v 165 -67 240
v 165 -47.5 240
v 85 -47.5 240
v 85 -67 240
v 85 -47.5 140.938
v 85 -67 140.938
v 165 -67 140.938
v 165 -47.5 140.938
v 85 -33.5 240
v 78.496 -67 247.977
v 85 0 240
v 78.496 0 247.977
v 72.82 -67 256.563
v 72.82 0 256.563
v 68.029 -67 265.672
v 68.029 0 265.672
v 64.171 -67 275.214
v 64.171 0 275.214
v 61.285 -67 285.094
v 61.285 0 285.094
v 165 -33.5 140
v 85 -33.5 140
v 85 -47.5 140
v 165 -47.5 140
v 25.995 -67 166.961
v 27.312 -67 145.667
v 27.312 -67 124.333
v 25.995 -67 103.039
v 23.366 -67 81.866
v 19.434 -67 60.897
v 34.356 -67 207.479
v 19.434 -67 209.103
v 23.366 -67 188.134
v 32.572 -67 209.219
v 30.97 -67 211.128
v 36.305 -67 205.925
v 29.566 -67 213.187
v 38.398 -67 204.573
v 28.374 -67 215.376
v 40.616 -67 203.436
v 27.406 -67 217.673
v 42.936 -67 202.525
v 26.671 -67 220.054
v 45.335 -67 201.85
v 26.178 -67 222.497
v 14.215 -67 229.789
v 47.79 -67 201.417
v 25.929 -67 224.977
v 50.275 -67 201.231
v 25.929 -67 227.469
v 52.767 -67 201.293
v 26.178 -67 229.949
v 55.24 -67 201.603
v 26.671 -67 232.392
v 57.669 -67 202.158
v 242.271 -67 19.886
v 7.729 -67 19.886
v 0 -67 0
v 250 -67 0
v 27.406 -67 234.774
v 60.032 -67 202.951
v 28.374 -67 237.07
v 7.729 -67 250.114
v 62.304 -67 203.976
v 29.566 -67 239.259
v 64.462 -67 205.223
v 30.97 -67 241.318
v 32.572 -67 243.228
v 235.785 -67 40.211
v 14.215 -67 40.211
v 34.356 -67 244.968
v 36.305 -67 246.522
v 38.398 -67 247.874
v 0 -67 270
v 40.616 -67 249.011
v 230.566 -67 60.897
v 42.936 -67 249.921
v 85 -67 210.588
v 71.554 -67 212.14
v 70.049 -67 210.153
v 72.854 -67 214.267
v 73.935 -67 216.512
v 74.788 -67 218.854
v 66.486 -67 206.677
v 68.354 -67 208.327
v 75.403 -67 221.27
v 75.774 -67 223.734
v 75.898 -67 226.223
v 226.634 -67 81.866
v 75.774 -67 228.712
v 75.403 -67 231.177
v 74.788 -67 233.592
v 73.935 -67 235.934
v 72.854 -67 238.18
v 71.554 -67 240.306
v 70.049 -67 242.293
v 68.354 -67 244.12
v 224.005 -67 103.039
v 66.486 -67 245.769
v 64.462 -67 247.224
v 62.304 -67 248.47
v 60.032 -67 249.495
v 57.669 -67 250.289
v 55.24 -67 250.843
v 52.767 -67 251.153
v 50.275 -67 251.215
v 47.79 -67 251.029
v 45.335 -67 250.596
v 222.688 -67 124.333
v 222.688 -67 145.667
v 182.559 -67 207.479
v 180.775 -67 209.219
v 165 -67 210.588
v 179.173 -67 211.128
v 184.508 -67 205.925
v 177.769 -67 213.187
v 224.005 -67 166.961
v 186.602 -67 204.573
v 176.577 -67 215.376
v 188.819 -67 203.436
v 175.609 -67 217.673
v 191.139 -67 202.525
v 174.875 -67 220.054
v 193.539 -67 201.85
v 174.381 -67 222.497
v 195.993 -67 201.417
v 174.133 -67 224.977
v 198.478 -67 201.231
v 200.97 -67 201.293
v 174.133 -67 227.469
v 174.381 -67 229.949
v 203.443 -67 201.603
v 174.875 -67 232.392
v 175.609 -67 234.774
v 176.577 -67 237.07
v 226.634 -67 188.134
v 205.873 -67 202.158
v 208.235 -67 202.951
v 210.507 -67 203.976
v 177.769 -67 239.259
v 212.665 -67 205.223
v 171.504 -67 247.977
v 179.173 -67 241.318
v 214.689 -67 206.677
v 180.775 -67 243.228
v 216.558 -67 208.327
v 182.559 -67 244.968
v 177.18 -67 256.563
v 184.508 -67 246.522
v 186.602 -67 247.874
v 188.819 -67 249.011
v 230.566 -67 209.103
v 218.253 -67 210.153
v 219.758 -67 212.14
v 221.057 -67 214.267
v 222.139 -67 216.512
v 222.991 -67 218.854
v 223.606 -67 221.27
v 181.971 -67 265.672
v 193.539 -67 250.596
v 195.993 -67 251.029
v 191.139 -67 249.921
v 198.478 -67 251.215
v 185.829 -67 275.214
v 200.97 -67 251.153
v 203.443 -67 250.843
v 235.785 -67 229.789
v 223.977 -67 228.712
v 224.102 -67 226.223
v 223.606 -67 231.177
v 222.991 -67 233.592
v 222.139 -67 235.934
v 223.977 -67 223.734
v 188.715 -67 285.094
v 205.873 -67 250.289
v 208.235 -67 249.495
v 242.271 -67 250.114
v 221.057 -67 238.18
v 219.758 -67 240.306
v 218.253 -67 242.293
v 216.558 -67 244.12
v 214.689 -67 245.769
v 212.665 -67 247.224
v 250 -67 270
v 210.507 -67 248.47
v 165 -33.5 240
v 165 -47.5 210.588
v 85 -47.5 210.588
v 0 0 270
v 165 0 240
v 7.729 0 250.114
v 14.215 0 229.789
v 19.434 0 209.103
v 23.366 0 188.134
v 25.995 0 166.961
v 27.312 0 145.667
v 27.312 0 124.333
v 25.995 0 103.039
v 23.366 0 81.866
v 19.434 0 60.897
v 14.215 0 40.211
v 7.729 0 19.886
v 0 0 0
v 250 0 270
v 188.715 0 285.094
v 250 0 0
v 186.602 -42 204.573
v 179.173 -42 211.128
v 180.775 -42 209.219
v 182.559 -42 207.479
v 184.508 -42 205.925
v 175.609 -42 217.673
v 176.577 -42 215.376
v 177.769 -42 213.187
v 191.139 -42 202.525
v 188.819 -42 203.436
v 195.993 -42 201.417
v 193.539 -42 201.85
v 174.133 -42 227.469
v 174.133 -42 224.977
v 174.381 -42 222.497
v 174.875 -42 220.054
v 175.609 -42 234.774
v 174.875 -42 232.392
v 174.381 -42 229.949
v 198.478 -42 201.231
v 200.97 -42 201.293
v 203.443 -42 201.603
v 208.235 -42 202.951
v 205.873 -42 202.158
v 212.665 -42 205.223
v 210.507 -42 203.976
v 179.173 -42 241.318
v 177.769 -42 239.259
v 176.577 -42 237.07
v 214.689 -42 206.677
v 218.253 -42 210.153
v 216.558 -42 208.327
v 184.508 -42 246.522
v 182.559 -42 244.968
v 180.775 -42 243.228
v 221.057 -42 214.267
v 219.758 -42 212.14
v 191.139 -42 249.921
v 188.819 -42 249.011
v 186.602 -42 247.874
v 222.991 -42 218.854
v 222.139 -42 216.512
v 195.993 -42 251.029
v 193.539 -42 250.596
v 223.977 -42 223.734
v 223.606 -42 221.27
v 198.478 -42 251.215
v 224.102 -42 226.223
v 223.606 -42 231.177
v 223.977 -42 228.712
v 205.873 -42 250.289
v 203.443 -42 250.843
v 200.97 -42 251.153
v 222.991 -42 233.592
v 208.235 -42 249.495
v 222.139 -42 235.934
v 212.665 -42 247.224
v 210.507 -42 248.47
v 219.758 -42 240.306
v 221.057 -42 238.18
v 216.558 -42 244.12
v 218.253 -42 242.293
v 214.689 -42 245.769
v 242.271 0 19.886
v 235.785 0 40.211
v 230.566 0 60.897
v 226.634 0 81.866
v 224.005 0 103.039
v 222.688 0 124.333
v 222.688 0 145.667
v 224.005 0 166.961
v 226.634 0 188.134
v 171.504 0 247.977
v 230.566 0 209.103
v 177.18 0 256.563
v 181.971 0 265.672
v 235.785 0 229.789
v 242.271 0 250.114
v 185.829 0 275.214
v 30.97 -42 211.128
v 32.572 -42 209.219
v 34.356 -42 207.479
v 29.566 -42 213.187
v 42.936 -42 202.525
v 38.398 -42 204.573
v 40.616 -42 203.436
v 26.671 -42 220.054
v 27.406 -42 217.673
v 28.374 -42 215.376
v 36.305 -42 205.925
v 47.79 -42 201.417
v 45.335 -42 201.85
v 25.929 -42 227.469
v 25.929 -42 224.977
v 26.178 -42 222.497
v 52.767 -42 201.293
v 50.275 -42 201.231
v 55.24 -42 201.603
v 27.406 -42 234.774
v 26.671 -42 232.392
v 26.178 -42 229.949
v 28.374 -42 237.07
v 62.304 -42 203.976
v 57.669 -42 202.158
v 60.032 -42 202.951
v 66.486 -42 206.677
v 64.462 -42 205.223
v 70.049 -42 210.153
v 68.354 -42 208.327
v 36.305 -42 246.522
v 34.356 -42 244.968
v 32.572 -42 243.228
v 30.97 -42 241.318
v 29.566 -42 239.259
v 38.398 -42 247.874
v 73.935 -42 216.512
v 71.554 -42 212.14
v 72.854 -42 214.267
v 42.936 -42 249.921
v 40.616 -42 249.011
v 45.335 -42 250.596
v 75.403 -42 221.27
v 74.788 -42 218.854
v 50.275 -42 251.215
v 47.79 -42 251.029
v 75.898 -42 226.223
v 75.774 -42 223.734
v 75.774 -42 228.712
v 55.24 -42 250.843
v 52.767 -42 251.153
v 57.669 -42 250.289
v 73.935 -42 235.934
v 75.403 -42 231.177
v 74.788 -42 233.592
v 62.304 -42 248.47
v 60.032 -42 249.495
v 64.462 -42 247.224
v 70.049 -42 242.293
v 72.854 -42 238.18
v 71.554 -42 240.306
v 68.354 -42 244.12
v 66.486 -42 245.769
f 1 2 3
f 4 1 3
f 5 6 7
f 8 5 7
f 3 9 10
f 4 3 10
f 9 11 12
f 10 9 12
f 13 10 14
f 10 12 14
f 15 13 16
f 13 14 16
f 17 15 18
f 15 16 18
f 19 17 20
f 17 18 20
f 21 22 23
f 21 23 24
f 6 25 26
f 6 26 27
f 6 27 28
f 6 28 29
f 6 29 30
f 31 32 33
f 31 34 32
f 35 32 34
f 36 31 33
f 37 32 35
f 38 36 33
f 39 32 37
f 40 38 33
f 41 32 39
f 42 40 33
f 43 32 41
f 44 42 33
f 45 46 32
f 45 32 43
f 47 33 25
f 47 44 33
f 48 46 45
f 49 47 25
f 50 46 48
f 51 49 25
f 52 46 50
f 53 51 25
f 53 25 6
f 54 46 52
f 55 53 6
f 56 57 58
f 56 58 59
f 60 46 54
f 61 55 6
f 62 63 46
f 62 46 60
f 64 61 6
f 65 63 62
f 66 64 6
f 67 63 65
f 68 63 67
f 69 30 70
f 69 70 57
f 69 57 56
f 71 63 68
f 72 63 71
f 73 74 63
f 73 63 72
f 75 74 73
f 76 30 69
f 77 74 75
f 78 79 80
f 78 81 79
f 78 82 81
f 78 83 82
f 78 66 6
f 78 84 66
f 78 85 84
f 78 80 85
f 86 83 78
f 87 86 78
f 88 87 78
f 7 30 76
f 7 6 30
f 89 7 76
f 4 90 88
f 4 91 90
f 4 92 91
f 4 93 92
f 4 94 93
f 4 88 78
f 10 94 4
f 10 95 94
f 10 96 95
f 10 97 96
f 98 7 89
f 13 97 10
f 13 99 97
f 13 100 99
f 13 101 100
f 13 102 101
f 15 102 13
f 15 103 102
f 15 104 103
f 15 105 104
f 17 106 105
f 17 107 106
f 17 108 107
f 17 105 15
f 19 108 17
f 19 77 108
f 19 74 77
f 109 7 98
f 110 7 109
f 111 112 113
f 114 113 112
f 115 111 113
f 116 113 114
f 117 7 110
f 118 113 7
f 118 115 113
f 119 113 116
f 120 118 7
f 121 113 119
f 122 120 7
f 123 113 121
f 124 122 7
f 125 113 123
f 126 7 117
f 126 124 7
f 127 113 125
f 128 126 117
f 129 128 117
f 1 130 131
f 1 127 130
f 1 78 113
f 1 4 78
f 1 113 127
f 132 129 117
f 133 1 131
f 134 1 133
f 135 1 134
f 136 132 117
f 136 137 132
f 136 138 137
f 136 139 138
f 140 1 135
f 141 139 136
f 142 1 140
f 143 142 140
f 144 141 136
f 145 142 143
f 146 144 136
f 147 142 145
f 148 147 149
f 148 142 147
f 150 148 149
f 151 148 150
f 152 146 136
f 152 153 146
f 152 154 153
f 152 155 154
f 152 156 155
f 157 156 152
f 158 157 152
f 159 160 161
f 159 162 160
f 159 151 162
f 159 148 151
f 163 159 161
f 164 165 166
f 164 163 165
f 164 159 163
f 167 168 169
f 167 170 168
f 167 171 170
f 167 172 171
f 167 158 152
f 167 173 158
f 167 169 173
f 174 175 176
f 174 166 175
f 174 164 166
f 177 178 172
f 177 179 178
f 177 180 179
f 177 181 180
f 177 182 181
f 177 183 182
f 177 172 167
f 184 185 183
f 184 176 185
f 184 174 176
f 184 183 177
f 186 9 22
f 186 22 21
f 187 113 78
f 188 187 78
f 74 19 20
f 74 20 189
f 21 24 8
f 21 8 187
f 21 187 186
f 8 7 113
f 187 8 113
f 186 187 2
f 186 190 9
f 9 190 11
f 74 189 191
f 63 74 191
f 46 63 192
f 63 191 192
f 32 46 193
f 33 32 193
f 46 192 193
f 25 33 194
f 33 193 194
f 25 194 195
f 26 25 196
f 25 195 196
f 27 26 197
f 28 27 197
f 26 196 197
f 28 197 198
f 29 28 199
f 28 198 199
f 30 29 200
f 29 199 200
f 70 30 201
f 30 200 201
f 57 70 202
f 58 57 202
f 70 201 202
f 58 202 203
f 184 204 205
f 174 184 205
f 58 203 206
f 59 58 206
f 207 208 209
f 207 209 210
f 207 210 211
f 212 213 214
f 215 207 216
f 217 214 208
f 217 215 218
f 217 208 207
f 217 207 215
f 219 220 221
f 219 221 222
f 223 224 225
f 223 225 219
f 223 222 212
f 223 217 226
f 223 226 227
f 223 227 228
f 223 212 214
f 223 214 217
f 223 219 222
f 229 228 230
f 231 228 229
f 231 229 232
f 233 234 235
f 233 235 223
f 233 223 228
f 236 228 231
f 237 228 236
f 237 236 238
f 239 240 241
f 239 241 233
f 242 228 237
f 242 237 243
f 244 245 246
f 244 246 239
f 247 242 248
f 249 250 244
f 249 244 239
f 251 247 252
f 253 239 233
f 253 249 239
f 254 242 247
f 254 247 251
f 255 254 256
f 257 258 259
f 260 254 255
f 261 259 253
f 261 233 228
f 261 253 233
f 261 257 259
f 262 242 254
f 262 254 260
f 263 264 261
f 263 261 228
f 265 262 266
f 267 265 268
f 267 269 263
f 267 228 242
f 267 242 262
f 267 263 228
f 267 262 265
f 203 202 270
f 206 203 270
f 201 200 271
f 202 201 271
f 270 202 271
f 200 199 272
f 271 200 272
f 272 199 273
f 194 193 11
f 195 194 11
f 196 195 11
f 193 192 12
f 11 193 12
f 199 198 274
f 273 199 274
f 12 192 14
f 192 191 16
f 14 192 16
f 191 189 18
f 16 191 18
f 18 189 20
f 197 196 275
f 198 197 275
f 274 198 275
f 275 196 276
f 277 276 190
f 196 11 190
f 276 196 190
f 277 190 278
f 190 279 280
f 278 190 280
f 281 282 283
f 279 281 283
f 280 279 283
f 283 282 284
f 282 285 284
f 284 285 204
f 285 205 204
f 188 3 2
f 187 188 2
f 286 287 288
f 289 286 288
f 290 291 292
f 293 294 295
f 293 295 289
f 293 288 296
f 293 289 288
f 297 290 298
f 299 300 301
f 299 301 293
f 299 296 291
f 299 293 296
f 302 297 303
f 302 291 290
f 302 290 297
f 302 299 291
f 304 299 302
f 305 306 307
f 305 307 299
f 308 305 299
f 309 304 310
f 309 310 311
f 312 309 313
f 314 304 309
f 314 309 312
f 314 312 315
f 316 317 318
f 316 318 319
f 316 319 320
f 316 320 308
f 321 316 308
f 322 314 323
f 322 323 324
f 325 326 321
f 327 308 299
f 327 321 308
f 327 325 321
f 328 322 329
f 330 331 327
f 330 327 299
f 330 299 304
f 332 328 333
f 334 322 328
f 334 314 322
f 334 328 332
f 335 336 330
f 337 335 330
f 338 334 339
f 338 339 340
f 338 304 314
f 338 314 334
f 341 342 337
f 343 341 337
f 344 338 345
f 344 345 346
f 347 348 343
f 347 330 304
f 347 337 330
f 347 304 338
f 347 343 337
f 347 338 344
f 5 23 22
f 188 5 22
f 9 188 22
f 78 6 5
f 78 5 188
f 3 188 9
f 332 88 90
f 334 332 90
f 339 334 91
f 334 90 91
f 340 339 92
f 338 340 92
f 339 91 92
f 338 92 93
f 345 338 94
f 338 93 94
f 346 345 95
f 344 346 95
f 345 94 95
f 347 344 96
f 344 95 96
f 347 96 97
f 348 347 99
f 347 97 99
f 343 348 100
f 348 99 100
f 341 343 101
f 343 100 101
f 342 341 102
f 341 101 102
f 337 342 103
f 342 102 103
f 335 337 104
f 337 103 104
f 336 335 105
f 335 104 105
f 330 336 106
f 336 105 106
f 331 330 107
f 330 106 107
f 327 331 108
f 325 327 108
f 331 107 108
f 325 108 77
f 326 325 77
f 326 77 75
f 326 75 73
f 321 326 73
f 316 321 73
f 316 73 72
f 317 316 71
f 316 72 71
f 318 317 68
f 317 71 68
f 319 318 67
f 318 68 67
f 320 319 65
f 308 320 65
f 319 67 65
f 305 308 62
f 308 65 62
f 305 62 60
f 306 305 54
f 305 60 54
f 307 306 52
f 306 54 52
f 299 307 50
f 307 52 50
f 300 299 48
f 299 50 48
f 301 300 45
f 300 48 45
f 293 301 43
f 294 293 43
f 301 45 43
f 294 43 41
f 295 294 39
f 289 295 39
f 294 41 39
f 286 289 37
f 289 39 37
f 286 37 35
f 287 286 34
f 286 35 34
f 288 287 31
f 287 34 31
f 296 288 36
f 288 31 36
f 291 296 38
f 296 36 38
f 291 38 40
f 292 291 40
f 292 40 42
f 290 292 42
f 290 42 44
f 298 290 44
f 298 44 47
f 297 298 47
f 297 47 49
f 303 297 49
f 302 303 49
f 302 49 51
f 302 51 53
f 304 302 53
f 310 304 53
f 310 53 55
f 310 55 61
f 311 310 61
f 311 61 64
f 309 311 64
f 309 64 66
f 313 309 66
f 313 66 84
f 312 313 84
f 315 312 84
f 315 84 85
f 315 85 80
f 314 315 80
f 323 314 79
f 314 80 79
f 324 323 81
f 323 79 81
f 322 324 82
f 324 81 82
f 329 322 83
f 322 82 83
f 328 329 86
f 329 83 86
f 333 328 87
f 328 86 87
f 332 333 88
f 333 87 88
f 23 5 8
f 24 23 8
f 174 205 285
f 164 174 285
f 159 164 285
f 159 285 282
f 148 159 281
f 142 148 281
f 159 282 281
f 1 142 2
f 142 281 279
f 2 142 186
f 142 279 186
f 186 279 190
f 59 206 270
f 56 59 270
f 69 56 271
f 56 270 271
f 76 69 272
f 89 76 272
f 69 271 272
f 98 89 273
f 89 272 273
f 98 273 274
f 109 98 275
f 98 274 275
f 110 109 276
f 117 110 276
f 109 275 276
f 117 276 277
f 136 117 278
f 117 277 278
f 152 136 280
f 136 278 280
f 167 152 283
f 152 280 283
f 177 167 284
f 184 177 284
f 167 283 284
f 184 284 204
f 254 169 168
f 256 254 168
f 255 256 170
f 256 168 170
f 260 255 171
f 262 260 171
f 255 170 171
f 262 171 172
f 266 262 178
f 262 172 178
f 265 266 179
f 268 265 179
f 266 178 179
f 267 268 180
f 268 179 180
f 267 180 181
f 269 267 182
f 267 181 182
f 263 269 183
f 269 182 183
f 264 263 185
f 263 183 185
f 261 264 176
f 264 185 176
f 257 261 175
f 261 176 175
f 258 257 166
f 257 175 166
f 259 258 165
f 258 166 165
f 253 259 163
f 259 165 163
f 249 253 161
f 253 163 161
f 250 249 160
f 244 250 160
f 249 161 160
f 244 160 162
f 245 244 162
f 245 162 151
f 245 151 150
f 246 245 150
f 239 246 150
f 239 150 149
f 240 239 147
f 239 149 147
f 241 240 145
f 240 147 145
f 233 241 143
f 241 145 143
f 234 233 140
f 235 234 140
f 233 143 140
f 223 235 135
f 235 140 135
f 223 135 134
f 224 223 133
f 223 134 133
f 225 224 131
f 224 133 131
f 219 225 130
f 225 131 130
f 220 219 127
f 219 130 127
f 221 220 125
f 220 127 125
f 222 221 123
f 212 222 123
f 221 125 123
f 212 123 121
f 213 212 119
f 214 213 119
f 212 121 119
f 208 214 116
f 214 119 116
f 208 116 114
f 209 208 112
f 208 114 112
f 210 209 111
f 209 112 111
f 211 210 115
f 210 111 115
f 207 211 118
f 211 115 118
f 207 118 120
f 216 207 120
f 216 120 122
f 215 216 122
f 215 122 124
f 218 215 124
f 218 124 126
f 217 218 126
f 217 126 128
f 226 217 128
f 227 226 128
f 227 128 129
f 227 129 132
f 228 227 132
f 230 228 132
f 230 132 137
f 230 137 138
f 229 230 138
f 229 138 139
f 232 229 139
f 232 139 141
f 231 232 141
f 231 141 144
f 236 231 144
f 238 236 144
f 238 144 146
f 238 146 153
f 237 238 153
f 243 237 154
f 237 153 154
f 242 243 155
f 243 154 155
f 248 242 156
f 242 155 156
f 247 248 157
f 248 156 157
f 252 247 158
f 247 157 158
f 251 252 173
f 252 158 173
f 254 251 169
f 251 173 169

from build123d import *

# Parameters (mm, degrees)
F1_DEPTH = 67
F2_W     = 40
F2_H     = 69.649726
F3_DEPTH = 28
F2_R     = 25
F4_DEPTH = 25
F5_W     = 80
F5_H     = 14
F6_DEPTH = 100


with BuildPart() as f1:
    # F0 (on Front) → F1 (new body)
    with BuildSketch(Plane.XZ):
        with BuildLine():
            ThreePointArc((0, 270), (27.477124, 135), (0, 0))
            Line((0, 0), (125, 0))
            Line((125, 0), (125, 240))
            Line((125, 240), (85, 240))
            ThreePointArc((85, 240), (70.310796, 261.057784), (61.28452, 285.093784))
            Line((61.28452, 285.093784), (0, 270))
        make_face()
        with BuildLine():
            Line((125, 240), (125, 0))
            Line((125, 0), (250, 0))
            ThreePointArc((250, 0), (222.522876, 135), (250, 270))
            Line((250, 270), (188.71548, 285.093784))
            ThreePointArc((188.71548, 285.093784), (179.689204, 261.057784), (165, 240))
            Line((165, 240), (125, 240))
        make_face()
    extrude(amount=F1_DEPTH)

    # F2 (on face) → F3 (cut)
    with BuildSketch(Plane.XZ.offset(67)):
        with Locations((105, 175.762683)):
            Rectangle(F2_W, F2_H)
        with Locations((145, 175.762683)):
            Rectangle(F2_W, F2_H)
    extrude(amount=-F3_DEPTH, mode=Mode.SUBTRACT)

    # F2 (on face) → F4 (cut)
    with BuildSketch(Plane.XZ.offset(67)):
        with Locations((105, 175.762683)):
            Rectangle(F2_W, F2_H)
        with Locations((145, 175.762683)):
            Rectangle(F2_W, F2_H)
        with Locations((50.898362, 226.223186)):
            Circle(F2_R)
        with Locations((199.101638, 226.223186)):
            Circle(F2_R)
    extrude(amount=-F4_DEPTH, mode=Mode.SUBTRACT)

    # F5 (on face) → F6 (cut)
    with BuildSketch(Plane.XY.offset(240)):
        with Locations((125, -40.5)):
            Rectangle(F5_W, F5_H)
    extrude(amount=-F6_DEPTH, mode=Mode.SUBTRACT)


solid = f1.part
